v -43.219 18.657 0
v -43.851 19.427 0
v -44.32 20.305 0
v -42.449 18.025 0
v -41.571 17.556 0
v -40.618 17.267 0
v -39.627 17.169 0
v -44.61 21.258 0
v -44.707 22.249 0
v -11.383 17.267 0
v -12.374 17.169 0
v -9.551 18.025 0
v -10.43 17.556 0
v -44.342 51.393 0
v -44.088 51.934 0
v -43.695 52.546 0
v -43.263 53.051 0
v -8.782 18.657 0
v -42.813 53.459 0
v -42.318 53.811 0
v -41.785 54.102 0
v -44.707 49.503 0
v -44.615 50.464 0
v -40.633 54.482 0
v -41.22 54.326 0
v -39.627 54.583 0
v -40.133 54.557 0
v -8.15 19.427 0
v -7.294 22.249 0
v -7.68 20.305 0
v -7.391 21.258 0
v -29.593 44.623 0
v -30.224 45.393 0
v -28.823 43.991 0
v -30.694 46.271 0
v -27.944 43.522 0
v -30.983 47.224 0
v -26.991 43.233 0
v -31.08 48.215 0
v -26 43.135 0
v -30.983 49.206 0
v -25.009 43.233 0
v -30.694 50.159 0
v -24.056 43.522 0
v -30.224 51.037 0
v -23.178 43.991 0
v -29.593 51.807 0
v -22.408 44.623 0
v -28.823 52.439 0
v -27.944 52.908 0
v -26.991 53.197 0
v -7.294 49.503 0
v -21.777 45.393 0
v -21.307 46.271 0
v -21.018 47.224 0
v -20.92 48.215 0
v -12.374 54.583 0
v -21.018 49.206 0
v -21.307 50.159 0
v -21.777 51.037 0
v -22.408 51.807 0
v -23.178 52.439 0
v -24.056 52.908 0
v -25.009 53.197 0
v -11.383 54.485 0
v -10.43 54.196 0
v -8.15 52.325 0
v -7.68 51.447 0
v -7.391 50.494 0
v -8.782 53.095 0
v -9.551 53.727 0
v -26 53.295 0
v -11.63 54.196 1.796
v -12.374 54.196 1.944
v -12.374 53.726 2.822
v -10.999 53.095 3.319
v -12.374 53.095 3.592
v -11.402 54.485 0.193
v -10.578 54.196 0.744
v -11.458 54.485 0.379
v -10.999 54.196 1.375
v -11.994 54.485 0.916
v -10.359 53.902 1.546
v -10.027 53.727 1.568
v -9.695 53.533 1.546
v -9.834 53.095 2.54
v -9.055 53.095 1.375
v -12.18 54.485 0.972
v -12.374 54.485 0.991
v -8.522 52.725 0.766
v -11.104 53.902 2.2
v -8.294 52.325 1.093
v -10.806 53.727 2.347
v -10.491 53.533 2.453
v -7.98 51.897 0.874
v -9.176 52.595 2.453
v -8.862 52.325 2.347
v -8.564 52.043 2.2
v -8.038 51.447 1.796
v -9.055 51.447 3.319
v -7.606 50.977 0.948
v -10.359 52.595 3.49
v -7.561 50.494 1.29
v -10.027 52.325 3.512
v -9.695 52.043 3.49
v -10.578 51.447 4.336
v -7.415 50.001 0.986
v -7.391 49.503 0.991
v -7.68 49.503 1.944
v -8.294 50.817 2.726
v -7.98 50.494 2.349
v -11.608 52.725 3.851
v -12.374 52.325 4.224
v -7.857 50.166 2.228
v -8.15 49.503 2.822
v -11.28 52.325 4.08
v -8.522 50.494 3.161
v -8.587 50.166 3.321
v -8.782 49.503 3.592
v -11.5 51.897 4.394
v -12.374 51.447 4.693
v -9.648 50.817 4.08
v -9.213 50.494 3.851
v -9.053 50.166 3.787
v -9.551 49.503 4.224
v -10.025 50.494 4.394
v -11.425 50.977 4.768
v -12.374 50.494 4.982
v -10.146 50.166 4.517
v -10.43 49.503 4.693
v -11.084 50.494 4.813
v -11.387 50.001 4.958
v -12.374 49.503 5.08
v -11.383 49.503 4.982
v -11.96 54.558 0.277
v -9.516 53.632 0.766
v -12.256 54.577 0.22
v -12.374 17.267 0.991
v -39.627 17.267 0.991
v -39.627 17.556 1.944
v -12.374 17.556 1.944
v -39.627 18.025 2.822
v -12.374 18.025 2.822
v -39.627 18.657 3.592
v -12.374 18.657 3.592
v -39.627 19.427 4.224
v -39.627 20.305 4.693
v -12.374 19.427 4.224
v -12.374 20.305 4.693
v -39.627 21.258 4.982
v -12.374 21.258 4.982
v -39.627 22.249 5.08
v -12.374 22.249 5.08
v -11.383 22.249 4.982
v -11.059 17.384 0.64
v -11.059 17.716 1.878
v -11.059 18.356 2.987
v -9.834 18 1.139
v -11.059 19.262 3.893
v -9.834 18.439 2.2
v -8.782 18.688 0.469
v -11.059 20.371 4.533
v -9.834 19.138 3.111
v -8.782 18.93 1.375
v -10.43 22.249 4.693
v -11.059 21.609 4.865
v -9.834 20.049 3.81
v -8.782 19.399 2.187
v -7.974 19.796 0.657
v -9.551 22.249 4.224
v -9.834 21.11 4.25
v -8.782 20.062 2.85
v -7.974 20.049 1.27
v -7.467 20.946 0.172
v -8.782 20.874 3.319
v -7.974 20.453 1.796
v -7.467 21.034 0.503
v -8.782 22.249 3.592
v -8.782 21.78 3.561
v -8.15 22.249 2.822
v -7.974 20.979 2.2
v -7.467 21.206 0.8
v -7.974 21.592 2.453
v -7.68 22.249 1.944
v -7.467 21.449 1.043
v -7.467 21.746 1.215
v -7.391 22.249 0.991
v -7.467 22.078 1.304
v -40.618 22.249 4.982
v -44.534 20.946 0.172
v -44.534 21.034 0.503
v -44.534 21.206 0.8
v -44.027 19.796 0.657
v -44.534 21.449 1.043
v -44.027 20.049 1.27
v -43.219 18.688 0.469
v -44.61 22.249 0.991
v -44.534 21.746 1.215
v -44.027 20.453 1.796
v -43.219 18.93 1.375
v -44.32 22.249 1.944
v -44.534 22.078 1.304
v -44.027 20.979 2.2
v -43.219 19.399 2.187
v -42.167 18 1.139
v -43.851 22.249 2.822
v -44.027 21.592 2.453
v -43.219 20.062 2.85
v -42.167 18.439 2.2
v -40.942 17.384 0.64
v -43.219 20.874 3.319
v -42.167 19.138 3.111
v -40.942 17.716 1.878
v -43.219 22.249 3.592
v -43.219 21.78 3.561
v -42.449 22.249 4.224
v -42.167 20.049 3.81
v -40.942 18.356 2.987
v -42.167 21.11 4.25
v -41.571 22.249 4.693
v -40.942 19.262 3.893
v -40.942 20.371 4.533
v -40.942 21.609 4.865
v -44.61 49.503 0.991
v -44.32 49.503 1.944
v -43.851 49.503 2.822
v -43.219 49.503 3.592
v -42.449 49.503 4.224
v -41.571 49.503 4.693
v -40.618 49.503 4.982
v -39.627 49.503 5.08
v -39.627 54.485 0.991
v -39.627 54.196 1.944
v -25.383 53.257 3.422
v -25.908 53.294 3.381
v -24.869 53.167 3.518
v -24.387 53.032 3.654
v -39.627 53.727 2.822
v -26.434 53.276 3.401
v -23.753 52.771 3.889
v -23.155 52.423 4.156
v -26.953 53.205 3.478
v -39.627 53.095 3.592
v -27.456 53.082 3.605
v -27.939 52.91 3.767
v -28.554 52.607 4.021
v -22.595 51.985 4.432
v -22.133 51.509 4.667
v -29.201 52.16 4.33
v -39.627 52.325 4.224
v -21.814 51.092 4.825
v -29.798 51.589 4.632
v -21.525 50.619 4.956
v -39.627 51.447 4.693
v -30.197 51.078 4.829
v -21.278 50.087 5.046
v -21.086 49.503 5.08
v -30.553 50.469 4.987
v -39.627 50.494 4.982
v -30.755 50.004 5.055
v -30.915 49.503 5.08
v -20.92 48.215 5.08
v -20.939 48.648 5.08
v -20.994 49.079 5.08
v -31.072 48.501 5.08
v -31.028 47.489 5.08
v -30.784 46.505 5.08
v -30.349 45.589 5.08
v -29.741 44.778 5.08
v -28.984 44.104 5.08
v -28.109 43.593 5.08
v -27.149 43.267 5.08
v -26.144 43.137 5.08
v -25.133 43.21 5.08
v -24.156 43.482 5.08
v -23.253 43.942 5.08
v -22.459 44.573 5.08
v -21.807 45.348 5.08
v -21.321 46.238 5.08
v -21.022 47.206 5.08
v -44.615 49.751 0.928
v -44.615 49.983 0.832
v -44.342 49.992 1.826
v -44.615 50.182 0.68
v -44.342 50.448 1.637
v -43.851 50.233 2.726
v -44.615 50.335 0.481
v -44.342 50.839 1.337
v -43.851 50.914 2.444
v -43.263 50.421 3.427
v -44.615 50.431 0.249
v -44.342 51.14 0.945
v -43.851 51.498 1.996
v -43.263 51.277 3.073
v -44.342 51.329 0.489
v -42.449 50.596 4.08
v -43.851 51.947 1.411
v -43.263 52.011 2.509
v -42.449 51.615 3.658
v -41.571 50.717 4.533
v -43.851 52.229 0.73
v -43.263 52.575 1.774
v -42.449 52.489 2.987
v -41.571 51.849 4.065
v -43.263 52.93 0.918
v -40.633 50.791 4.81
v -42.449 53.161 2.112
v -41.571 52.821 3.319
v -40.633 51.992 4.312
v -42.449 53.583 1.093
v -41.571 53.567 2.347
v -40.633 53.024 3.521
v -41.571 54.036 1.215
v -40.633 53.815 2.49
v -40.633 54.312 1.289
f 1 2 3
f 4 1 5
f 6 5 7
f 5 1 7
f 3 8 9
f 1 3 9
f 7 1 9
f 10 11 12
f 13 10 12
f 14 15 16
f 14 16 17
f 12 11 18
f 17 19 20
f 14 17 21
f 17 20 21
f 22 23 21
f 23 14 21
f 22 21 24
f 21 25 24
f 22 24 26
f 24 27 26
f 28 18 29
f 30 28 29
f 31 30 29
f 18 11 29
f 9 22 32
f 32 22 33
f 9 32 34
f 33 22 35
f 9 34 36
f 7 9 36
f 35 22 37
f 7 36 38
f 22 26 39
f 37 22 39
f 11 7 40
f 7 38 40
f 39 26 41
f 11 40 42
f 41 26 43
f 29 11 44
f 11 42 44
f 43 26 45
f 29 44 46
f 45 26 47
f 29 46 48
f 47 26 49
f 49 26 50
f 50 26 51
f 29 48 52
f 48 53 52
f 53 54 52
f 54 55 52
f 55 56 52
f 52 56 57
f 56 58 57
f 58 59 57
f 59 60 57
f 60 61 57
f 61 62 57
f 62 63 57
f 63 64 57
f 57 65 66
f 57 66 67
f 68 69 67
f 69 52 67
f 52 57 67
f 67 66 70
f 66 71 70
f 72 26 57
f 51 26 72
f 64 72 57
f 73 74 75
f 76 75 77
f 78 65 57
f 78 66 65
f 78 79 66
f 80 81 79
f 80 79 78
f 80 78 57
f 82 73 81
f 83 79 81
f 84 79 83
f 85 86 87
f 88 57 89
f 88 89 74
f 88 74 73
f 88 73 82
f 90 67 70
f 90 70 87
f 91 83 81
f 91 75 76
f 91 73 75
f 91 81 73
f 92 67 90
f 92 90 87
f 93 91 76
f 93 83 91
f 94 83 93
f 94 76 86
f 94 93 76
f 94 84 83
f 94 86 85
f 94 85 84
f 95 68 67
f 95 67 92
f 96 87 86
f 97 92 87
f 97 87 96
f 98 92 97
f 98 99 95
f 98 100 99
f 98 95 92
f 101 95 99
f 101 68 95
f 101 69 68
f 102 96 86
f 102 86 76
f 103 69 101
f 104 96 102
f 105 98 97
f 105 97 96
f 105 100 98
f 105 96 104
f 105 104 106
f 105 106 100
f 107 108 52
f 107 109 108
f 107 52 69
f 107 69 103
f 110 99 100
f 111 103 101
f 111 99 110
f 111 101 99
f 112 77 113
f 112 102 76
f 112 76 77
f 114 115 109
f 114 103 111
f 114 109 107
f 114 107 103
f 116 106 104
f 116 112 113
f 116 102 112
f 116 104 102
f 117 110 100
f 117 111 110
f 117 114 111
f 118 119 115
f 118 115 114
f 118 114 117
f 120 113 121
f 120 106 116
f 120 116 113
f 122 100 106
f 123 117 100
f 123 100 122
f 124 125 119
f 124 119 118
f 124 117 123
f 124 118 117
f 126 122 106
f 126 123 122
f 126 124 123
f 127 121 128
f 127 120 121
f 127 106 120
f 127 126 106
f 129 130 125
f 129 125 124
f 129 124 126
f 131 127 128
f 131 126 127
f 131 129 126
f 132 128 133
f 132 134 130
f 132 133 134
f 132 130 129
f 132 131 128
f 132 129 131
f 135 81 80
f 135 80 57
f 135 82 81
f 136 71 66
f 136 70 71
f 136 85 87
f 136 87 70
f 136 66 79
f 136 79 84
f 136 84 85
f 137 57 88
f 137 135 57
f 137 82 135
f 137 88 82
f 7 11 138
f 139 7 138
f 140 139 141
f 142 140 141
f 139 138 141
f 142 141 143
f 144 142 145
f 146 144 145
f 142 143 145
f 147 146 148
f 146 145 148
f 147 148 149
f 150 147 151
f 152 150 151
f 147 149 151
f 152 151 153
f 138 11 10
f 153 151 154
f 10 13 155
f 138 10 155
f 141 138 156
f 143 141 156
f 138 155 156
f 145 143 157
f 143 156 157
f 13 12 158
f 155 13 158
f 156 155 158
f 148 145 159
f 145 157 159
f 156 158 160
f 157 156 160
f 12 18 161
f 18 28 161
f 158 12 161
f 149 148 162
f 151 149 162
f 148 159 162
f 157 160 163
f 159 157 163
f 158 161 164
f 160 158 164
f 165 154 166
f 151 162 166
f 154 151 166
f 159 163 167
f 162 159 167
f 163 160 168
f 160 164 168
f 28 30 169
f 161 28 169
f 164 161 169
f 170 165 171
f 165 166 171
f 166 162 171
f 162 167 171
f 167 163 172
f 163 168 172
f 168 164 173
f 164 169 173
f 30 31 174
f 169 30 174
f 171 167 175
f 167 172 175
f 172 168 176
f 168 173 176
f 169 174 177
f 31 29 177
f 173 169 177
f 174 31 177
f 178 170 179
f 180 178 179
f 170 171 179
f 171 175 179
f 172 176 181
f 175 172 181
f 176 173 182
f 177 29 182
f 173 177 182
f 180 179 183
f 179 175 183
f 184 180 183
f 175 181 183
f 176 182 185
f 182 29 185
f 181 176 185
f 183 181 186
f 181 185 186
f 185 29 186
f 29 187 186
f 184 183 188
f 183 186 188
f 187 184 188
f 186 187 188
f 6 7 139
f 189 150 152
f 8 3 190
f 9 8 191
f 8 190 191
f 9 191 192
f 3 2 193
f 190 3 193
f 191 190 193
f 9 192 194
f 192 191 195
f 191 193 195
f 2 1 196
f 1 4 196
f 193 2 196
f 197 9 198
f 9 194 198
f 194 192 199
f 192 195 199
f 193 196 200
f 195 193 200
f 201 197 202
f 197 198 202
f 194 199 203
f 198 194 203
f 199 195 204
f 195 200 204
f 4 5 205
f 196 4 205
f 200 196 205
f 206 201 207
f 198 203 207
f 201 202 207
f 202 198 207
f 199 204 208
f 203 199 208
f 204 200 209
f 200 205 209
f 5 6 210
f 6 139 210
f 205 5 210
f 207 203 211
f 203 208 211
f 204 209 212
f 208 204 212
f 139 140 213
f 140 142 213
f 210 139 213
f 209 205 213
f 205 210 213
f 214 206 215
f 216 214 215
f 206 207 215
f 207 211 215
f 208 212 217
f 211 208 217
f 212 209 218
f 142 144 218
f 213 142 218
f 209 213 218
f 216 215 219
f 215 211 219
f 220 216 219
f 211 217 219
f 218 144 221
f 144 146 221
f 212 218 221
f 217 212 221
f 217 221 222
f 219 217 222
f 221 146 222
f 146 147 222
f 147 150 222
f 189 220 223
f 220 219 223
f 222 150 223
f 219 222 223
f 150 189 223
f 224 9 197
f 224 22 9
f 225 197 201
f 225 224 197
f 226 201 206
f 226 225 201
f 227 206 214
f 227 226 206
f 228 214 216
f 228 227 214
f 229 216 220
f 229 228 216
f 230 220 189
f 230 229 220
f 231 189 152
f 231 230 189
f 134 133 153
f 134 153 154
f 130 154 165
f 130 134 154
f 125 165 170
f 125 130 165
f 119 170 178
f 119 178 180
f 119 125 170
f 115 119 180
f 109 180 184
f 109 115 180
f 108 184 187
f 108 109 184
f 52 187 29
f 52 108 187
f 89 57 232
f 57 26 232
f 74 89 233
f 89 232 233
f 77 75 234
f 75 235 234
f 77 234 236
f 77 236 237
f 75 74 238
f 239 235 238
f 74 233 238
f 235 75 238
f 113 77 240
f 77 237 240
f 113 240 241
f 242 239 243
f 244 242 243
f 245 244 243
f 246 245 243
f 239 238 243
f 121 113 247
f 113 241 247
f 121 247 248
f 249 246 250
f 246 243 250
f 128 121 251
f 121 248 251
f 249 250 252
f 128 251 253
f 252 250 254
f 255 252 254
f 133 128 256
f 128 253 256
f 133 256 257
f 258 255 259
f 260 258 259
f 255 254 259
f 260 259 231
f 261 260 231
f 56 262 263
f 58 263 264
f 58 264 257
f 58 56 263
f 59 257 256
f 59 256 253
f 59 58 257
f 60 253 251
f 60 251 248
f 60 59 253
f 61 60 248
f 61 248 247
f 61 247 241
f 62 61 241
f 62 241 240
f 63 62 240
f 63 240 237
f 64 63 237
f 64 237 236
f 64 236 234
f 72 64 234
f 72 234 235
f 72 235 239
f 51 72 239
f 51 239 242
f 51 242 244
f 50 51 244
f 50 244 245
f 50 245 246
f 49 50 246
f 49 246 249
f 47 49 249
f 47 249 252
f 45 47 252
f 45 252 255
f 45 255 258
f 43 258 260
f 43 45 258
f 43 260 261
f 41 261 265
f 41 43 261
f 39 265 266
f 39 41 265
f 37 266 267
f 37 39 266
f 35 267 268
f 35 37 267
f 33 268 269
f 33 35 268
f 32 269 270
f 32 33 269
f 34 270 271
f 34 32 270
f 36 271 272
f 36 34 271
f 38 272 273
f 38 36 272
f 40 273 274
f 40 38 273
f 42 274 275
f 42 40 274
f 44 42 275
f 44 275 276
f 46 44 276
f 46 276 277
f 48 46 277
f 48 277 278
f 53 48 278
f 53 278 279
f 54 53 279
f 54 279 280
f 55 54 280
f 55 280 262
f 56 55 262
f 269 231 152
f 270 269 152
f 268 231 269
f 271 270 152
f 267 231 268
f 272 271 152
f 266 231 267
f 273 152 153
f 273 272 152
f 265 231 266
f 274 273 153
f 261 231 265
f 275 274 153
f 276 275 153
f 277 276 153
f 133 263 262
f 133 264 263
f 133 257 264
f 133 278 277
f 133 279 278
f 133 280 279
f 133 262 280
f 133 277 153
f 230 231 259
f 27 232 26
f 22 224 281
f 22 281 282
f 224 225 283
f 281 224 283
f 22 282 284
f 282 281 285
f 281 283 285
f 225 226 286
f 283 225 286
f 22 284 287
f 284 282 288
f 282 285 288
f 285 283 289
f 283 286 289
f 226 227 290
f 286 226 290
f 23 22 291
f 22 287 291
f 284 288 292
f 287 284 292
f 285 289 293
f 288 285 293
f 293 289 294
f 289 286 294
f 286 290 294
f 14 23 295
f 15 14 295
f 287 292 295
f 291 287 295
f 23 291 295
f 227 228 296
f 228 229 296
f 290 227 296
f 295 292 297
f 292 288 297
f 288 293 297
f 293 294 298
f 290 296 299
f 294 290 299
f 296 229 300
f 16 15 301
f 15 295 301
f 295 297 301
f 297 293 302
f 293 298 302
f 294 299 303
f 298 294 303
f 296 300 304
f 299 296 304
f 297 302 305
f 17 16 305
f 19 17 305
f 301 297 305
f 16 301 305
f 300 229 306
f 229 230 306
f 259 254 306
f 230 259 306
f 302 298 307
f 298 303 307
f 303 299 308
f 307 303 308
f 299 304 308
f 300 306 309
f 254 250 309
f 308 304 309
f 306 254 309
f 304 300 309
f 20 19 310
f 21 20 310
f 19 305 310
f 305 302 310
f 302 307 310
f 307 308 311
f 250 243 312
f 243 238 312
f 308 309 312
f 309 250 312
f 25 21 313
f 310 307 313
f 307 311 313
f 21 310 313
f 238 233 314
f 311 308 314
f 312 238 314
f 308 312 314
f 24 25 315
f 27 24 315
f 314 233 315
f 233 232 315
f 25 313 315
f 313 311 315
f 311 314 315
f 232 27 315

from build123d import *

# Parameters (mm, degrees)
F0_W        = 37.4135075825
F0_H        = 37.4135057104
F0_R        = 5.08
F1_DEPTH    = 5.08
F2_R        = 5.07999
F3_R        = 5.07999
F4_T1_DEPTH = 57.7335175825
F4_T3_DEPTH = 25.40001
F4_T6_ANGLE = 90
F5_R        = 5.07999


# Not quite as in the source:
# - a fillet or chamfer that OpenCascade refuses, or shapes differently, is made with other operations: its cross-section is extruded or revolved along the edge and cut away or added
# - a fillet or chamfer is up to 0.001 mm smaller than in the source, because OpenCascade refuses the exact size


with BuildPart() as f1:
    # F0 (on Top) → F1 (new body)
    with BuildSketch(Plane.XY):
        with Locations((-26.0004317388, 35.8758829534)):
            Rectangle(F0_W, F0_H)
        with Locations((-26.0004317388, 48.2149645656)):
            Circle(F0_R, mode=Mode.SUBTRACT)
    extrude(amount=F1_DEPTH)

    # F2 (radius 5.08 in the source; OpenCascade refuses exactly that, so slightly less here)
    f2_edges = [f1.edges().sort_by_distance(p)[0] for p in [
        (-26.000432, 17.16913, 5.08),
    ]]
    fillet(f2_edges, radius=F2_R)

    # F3 (radius 5.08 in the source; OpenCascade refuses exactly that, so slightly less here)
    f3_edges = [f1.edges().sort_by_distance(p)[0] for p in [
        (-7.293678, 38.415878, 5.08),
    ]]
    fillet(f3_edges, radius=F3_R)

    # F4: fillet of radius 5.08 on 1 edges, made by hand

    # F4_s2 → F4_t1 (cut)
    with BuildSketch(Plane.YZ.offset(-57.40718553)):
        with BuildLine():
            ThreePointArc((54.5826358086, 0), (53.094738257, 3.5921024484), (49.5026358086, 5.08))
            Line((49.5026358086, 5.08), (54.5826358086, 5.08))
            Line((54.5826358086, 5.08), (54.5826358086, 0))
        make_face()
    extrude(amount=F4_T1_DEPTH, mode=Mode.SUBTRACT)

    # F4_s4 → F4_t3 (cut)
    with BuildSketch(Plane.XY.offset(-12.7)):
        with BuildLine():
            ThreePointArc((-7.2936779475, 49.5026358086), (-8.7815754991, 53.094738257), (-12.3736779475, 54.5826358086))
            Line((-12.3736779475, 54.5826358086), (-7.2936779475, 54.5826358086))
            Line((-7.2936779475, 54.5826358086), (-7.2936779475, 49.5026358086))
        make_face()
    extrude(amount=F4_T3_DEPTH, mode=Mode.SUBTRACT)

    # F4_s5 → F4_t6 (revolve, cut)
    with BuildSketch(Plane.XY.offset(1e-05)):
        with BuildLine():
            ThreePointArc((-12.3736679475, 54.5826358086), (-8.7815719636, 53.0947347215), (-7.2936779475, 49.5026358086))
            Line((-7.2936779475, 49.5026358086), (-7.2936779475, 54.5826358086))
            Line((-7.2936779475, 54.5826358086), (-12.3736679475, 54.5826358086))
        make_face()
    revolve(axis=Axis((-12.3736679475, 54.5826358086, 1e-05), (0, -1, 0)), revolution_arc=F4_T6_ANGLE, mode=Mode.SUBTRACT)

    # F5 (radius 5.08 in the source; OpenCascade refuses exactly that, so slightly less here)
    f5_edges = [f1.edges().sort_by_distance(p)[0] for p in [
        (-44.707186, 35.875878, 5.08),
        (-44.707186, 17.16913, 5e-06),
        (-44.707186, 18.657025, 3.592105),
        (-44.707186, 53.094738, 3.592102),
    ]]
    fillet(f5_edges, radius=F5_R)


solid = f1.part
